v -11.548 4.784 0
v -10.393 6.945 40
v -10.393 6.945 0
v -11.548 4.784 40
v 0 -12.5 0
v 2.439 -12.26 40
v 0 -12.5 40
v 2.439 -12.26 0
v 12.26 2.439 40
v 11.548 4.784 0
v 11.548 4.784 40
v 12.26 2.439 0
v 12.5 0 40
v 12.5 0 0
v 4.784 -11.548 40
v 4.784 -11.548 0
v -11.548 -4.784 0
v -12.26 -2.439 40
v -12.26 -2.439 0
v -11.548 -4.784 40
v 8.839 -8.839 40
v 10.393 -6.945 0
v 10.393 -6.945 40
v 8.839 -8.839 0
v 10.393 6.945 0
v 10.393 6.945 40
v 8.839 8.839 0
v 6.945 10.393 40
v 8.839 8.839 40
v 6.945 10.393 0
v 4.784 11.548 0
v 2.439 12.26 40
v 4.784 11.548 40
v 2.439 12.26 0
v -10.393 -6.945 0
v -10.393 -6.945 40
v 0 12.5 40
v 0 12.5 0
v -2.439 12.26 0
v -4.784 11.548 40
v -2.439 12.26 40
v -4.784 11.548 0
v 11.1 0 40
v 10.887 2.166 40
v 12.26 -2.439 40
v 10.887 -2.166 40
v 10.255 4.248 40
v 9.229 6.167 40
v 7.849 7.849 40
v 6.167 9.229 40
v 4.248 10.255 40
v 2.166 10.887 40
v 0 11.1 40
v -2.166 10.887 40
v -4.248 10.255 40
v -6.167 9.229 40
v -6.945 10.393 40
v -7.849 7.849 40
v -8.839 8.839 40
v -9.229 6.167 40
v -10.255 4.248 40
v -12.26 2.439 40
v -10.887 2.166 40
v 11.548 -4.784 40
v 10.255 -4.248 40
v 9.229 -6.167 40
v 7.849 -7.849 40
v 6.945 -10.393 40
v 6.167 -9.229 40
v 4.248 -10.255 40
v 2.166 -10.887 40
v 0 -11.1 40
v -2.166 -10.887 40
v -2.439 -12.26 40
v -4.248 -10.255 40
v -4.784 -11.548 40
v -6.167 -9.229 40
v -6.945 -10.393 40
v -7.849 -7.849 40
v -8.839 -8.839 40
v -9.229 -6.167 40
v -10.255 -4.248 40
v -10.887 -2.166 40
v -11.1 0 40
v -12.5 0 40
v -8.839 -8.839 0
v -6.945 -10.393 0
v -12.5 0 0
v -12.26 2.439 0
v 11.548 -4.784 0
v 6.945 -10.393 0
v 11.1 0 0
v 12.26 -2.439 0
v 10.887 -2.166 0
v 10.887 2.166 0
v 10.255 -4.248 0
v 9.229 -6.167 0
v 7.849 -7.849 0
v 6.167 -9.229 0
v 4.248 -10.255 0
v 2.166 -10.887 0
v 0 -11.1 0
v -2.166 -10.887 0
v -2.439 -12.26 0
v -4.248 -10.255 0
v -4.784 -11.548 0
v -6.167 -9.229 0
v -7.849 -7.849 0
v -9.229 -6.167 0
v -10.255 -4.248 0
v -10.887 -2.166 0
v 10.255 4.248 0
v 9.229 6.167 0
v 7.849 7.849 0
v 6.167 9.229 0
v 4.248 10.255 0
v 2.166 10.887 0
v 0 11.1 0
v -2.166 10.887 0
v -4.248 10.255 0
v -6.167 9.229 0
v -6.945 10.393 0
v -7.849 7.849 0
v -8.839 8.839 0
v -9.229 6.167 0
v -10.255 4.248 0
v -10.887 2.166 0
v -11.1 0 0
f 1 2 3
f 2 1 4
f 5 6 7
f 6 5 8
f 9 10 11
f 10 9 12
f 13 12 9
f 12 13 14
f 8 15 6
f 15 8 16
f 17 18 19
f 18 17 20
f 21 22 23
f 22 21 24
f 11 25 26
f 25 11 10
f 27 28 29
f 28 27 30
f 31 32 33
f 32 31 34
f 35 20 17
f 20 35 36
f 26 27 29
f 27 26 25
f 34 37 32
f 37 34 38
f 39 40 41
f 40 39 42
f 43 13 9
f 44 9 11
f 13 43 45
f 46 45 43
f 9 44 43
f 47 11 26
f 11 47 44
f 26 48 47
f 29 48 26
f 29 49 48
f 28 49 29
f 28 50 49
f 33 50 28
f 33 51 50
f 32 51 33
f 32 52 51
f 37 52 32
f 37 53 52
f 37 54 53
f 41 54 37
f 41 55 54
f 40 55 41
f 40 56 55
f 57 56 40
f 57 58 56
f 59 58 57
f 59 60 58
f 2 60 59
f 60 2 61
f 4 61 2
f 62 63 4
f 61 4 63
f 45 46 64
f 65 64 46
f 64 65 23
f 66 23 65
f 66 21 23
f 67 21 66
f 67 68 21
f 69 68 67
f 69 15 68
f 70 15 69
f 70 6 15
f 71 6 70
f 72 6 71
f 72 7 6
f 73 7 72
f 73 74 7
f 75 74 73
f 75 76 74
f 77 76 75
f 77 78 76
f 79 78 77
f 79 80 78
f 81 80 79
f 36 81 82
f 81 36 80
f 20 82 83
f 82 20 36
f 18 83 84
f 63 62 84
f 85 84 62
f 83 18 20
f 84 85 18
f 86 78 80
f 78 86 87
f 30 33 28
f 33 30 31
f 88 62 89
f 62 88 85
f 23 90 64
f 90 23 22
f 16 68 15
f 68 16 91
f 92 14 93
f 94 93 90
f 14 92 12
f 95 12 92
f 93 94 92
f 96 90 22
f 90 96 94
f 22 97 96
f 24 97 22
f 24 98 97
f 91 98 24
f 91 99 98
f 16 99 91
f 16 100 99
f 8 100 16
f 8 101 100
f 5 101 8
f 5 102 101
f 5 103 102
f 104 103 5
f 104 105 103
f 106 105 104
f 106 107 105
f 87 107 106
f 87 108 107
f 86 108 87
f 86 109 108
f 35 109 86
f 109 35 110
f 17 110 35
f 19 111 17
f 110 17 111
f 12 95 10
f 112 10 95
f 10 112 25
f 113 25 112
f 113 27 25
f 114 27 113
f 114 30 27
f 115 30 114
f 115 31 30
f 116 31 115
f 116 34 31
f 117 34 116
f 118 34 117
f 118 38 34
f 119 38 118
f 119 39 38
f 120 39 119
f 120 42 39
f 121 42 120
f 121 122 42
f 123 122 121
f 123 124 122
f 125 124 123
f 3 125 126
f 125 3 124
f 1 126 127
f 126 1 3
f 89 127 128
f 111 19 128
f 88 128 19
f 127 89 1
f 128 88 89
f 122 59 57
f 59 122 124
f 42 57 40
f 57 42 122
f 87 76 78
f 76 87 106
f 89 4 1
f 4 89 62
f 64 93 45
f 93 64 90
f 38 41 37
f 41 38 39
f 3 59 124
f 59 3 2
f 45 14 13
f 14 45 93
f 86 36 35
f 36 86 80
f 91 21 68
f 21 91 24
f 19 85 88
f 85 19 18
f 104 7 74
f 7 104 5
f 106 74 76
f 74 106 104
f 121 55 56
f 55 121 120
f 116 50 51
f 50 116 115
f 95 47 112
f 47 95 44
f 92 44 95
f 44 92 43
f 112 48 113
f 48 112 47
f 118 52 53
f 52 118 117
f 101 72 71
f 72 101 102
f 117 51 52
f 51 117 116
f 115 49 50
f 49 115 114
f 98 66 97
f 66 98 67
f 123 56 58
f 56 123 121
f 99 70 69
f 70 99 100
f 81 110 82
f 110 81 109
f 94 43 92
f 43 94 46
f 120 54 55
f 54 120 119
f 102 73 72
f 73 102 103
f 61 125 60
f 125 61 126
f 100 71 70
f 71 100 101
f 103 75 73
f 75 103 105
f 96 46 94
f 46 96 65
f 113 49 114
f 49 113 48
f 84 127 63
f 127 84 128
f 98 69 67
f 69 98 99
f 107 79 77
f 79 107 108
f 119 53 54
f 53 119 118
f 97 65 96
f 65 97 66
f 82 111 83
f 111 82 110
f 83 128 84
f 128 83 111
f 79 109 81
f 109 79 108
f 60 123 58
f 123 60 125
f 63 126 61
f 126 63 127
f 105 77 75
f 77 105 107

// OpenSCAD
$fn = 32;

// ----------------------------------------------------------------------
// Thin tube: 1.4 mm wall
// ----------------------------------------------------------------------

// --- parameters (mm) ---
tube_od = 25;             // outer diameter
tube_h = 40;              // height, Z
wall = 1.4;               // wall thickness

difference() {
  cylinder(h = tube_h, d = tube_od);
  translate([0, 0, -1]) cylinder(h = tube_h + 2, d = tube_od - 2 * wall);
}
